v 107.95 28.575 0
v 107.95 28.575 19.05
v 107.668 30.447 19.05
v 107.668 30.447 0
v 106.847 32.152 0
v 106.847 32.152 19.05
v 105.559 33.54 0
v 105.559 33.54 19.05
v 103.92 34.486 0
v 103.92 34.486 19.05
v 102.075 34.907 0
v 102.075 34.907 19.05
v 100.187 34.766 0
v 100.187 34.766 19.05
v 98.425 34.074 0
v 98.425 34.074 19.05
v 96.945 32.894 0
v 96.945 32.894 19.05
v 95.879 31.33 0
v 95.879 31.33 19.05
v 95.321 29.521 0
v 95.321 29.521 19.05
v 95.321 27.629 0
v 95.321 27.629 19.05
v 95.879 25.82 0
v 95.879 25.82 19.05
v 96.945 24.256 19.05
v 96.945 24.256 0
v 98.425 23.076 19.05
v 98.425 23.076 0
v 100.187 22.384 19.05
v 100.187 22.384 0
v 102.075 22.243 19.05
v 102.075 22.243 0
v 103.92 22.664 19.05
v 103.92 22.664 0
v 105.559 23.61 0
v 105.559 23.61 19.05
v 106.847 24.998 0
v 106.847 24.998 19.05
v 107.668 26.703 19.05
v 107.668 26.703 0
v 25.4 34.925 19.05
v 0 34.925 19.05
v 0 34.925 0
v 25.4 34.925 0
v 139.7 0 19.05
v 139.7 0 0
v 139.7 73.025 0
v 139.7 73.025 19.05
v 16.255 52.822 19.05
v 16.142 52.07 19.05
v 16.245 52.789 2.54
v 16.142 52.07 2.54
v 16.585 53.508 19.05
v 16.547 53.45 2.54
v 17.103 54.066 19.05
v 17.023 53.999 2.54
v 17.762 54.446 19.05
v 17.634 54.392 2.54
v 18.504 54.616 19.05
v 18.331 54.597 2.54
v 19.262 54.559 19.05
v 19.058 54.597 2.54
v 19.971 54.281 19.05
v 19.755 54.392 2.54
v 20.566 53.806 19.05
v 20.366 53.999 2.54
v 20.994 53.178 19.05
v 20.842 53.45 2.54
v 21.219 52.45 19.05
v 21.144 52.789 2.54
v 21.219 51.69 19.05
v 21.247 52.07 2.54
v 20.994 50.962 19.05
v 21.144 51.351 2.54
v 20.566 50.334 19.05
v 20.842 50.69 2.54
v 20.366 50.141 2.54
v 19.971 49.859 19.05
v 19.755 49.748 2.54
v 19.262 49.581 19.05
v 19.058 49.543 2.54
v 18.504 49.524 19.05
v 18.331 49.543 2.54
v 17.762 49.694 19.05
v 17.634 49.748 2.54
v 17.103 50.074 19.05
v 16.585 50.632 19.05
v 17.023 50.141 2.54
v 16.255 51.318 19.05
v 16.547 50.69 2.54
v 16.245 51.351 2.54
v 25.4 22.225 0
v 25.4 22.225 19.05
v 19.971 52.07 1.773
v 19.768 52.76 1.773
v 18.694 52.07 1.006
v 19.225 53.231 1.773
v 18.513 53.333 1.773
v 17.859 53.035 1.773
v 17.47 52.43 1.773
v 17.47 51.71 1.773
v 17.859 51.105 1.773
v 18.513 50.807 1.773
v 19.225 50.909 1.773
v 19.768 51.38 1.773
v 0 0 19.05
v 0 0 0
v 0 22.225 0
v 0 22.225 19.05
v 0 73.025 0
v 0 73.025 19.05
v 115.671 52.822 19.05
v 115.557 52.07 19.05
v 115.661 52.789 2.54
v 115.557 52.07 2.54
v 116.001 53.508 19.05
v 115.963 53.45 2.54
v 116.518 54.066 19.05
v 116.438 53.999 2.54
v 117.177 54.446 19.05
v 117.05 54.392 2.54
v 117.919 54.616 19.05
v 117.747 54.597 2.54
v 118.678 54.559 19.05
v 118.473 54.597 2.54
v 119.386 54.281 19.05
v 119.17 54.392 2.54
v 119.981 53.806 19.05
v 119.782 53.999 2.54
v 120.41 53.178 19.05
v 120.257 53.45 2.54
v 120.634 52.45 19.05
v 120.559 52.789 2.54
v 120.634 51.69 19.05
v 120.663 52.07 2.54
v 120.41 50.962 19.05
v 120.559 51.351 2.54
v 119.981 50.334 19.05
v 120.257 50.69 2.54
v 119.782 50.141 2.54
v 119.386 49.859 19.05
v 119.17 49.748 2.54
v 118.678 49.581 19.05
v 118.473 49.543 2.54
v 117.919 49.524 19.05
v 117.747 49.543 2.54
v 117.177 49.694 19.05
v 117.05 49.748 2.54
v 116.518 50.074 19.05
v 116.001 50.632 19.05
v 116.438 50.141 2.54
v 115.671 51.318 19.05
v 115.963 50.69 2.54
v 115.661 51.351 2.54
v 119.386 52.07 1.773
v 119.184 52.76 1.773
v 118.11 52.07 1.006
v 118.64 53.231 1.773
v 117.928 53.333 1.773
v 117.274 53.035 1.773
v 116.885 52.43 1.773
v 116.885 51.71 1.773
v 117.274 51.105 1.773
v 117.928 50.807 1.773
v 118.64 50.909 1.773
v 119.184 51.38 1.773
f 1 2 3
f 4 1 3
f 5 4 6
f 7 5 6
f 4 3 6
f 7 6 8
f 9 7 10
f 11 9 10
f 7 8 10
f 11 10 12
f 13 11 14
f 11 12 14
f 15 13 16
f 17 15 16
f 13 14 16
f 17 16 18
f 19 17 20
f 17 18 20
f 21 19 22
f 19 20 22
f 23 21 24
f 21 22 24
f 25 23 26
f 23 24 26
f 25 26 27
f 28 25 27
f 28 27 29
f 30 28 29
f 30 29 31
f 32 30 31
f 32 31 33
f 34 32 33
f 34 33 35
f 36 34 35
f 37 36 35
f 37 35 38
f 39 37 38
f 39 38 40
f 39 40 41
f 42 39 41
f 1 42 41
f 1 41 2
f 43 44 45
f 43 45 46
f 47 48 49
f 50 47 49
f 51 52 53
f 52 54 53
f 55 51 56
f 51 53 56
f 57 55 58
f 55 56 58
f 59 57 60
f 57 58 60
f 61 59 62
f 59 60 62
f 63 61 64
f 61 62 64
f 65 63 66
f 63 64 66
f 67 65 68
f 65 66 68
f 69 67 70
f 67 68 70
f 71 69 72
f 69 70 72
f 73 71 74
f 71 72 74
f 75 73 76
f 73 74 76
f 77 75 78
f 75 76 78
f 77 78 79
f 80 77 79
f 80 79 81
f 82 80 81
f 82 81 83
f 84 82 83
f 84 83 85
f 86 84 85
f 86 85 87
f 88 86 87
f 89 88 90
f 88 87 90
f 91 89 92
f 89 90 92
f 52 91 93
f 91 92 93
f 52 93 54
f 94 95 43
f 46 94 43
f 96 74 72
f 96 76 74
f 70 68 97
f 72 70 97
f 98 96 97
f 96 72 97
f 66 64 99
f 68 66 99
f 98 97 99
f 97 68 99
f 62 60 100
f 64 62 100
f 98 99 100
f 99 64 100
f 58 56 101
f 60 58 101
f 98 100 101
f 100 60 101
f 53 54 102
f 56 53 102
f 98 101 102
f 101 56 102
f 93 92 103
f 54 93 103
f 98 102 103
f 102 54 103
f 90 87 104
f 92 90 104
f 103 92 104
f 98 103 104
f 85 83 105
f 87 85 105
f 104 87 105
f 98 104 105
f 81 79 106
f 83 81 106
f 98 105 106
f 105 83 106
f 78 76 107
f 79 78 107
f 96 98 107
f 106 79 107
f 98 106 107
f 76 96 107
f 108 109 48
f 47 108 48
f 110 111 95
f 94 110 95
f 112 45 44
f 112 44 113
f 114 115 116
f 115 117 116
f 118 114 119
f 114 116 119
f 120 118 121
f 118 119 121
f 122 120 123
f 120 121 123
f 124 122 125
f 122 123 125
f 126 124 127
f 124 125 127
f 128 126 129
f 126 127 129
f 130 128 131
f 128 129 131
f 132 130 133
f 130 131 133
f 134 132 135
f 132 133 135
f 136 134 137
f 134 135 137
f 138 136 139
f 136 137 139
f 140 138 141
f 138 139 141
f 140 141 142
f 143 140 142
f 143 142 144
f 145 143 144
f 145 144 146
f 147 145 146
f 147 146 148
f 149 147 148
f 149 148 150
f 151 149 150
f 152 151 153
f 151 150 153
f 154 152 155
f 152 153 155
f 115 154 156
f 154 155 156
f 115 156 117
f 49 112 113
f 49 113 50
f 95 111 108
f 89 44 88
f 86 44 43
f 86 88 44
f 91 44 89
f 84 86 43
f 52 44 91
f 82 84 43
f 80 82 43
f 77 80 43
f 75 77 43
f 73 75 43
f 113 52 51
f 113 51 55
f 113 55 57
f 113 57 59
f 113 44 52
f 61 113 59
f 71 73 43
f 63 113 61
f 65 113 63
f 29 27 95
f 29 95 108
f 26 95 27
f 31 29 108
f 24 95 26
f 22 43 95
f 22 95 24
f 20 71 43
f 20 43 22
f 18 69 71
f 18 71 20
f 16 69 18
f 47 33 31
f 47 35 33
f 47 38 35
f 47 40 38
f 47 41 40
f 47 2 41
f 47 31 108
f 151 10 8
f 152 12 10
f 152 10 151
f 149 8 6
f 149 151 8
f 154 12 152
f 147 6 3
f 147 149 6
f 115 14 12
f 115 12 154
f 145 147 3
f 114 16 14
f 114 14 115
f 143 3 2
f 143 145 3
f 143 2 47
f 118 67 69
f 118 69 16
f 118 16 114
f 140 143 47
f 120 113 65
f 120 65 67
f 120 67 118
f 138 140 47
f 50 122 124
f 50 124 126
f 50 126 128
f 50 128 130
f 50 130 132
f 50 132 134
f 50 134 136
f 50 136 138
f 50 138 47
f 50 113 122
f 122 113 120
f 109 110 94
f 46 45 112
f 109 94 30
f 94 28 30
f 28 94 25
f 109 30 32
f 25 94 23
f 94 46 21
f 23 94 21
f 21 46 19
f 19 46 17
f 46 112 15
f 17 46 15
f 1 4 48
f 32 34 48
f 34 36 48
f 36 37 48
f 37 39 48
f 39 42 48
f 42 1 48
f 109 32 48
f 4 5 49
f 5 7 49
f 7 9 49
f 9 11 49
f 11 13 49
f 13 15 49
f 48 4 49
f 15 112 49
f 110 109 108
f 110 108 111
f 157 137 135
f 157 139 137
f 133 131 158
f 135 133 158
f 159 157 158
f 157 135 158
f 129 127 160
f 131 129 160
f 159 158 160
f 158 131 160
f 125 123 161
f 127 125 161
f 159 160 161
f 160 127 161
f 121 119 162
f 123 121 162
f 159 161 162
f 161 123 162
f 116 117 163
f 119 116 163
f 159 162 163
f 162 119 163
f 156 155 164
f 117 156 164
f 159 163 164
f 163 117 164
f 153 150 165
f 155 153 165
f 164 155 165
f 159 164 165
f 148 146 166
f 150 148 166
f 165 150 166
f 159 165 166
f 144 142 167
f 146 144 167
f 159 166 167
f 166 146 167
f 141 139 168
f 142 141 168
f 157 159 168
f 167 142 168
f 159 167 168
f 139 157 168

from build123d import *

# Parameters (mm, degrees)
F0_W     = 139.7
F0_H     = 73.025
F1_DEPTH = 19.05
F2_W     = 25.4
F2_H     = 12.7
F2_R     = 6.35
F3_DEPTH = 25.4
F5_D     = 5.1054
F5_DEPTH = 16.51
F5_TIP   = 1.5338169022


with BuildPart() as f1:
    # F0 (on Top) → F1 (new body)
    with BuildSketch(Plane.XY):
        with Locations((69.85, 36.5125)):
            Rectangle(F0_W, F0_H)
    extrude(amount=F1_DEPTH)

    # F2 (on face) → F3 (cut)
    with BuildSketch(Plane.XY.offset(19.05)):
        with Locations((12.7, 28.575)):
            Rectangle(F2_W, F2_H)
        with Locations((101.6, 28.575)):
            Circle(F2_R)
    extrude(amount=-F3_DEPTH, mode=Mode.SUBTRACT)

    # F5
    with Locations(Plane.XY.offset(19.05)):
        with Locations((18.6944, 52.07), (118.11, 52.07)):
            Hole(F5_D / 2, depth=F5_DEPTH)
            with Locations((0, 0, -(F5_DEPTH + F5_TIP / 2))):  # 118° drill point
                Cone(0, F5_D / 2, F5_TIP, mode=Mode.SUBTRACT)


solid = f1.part
